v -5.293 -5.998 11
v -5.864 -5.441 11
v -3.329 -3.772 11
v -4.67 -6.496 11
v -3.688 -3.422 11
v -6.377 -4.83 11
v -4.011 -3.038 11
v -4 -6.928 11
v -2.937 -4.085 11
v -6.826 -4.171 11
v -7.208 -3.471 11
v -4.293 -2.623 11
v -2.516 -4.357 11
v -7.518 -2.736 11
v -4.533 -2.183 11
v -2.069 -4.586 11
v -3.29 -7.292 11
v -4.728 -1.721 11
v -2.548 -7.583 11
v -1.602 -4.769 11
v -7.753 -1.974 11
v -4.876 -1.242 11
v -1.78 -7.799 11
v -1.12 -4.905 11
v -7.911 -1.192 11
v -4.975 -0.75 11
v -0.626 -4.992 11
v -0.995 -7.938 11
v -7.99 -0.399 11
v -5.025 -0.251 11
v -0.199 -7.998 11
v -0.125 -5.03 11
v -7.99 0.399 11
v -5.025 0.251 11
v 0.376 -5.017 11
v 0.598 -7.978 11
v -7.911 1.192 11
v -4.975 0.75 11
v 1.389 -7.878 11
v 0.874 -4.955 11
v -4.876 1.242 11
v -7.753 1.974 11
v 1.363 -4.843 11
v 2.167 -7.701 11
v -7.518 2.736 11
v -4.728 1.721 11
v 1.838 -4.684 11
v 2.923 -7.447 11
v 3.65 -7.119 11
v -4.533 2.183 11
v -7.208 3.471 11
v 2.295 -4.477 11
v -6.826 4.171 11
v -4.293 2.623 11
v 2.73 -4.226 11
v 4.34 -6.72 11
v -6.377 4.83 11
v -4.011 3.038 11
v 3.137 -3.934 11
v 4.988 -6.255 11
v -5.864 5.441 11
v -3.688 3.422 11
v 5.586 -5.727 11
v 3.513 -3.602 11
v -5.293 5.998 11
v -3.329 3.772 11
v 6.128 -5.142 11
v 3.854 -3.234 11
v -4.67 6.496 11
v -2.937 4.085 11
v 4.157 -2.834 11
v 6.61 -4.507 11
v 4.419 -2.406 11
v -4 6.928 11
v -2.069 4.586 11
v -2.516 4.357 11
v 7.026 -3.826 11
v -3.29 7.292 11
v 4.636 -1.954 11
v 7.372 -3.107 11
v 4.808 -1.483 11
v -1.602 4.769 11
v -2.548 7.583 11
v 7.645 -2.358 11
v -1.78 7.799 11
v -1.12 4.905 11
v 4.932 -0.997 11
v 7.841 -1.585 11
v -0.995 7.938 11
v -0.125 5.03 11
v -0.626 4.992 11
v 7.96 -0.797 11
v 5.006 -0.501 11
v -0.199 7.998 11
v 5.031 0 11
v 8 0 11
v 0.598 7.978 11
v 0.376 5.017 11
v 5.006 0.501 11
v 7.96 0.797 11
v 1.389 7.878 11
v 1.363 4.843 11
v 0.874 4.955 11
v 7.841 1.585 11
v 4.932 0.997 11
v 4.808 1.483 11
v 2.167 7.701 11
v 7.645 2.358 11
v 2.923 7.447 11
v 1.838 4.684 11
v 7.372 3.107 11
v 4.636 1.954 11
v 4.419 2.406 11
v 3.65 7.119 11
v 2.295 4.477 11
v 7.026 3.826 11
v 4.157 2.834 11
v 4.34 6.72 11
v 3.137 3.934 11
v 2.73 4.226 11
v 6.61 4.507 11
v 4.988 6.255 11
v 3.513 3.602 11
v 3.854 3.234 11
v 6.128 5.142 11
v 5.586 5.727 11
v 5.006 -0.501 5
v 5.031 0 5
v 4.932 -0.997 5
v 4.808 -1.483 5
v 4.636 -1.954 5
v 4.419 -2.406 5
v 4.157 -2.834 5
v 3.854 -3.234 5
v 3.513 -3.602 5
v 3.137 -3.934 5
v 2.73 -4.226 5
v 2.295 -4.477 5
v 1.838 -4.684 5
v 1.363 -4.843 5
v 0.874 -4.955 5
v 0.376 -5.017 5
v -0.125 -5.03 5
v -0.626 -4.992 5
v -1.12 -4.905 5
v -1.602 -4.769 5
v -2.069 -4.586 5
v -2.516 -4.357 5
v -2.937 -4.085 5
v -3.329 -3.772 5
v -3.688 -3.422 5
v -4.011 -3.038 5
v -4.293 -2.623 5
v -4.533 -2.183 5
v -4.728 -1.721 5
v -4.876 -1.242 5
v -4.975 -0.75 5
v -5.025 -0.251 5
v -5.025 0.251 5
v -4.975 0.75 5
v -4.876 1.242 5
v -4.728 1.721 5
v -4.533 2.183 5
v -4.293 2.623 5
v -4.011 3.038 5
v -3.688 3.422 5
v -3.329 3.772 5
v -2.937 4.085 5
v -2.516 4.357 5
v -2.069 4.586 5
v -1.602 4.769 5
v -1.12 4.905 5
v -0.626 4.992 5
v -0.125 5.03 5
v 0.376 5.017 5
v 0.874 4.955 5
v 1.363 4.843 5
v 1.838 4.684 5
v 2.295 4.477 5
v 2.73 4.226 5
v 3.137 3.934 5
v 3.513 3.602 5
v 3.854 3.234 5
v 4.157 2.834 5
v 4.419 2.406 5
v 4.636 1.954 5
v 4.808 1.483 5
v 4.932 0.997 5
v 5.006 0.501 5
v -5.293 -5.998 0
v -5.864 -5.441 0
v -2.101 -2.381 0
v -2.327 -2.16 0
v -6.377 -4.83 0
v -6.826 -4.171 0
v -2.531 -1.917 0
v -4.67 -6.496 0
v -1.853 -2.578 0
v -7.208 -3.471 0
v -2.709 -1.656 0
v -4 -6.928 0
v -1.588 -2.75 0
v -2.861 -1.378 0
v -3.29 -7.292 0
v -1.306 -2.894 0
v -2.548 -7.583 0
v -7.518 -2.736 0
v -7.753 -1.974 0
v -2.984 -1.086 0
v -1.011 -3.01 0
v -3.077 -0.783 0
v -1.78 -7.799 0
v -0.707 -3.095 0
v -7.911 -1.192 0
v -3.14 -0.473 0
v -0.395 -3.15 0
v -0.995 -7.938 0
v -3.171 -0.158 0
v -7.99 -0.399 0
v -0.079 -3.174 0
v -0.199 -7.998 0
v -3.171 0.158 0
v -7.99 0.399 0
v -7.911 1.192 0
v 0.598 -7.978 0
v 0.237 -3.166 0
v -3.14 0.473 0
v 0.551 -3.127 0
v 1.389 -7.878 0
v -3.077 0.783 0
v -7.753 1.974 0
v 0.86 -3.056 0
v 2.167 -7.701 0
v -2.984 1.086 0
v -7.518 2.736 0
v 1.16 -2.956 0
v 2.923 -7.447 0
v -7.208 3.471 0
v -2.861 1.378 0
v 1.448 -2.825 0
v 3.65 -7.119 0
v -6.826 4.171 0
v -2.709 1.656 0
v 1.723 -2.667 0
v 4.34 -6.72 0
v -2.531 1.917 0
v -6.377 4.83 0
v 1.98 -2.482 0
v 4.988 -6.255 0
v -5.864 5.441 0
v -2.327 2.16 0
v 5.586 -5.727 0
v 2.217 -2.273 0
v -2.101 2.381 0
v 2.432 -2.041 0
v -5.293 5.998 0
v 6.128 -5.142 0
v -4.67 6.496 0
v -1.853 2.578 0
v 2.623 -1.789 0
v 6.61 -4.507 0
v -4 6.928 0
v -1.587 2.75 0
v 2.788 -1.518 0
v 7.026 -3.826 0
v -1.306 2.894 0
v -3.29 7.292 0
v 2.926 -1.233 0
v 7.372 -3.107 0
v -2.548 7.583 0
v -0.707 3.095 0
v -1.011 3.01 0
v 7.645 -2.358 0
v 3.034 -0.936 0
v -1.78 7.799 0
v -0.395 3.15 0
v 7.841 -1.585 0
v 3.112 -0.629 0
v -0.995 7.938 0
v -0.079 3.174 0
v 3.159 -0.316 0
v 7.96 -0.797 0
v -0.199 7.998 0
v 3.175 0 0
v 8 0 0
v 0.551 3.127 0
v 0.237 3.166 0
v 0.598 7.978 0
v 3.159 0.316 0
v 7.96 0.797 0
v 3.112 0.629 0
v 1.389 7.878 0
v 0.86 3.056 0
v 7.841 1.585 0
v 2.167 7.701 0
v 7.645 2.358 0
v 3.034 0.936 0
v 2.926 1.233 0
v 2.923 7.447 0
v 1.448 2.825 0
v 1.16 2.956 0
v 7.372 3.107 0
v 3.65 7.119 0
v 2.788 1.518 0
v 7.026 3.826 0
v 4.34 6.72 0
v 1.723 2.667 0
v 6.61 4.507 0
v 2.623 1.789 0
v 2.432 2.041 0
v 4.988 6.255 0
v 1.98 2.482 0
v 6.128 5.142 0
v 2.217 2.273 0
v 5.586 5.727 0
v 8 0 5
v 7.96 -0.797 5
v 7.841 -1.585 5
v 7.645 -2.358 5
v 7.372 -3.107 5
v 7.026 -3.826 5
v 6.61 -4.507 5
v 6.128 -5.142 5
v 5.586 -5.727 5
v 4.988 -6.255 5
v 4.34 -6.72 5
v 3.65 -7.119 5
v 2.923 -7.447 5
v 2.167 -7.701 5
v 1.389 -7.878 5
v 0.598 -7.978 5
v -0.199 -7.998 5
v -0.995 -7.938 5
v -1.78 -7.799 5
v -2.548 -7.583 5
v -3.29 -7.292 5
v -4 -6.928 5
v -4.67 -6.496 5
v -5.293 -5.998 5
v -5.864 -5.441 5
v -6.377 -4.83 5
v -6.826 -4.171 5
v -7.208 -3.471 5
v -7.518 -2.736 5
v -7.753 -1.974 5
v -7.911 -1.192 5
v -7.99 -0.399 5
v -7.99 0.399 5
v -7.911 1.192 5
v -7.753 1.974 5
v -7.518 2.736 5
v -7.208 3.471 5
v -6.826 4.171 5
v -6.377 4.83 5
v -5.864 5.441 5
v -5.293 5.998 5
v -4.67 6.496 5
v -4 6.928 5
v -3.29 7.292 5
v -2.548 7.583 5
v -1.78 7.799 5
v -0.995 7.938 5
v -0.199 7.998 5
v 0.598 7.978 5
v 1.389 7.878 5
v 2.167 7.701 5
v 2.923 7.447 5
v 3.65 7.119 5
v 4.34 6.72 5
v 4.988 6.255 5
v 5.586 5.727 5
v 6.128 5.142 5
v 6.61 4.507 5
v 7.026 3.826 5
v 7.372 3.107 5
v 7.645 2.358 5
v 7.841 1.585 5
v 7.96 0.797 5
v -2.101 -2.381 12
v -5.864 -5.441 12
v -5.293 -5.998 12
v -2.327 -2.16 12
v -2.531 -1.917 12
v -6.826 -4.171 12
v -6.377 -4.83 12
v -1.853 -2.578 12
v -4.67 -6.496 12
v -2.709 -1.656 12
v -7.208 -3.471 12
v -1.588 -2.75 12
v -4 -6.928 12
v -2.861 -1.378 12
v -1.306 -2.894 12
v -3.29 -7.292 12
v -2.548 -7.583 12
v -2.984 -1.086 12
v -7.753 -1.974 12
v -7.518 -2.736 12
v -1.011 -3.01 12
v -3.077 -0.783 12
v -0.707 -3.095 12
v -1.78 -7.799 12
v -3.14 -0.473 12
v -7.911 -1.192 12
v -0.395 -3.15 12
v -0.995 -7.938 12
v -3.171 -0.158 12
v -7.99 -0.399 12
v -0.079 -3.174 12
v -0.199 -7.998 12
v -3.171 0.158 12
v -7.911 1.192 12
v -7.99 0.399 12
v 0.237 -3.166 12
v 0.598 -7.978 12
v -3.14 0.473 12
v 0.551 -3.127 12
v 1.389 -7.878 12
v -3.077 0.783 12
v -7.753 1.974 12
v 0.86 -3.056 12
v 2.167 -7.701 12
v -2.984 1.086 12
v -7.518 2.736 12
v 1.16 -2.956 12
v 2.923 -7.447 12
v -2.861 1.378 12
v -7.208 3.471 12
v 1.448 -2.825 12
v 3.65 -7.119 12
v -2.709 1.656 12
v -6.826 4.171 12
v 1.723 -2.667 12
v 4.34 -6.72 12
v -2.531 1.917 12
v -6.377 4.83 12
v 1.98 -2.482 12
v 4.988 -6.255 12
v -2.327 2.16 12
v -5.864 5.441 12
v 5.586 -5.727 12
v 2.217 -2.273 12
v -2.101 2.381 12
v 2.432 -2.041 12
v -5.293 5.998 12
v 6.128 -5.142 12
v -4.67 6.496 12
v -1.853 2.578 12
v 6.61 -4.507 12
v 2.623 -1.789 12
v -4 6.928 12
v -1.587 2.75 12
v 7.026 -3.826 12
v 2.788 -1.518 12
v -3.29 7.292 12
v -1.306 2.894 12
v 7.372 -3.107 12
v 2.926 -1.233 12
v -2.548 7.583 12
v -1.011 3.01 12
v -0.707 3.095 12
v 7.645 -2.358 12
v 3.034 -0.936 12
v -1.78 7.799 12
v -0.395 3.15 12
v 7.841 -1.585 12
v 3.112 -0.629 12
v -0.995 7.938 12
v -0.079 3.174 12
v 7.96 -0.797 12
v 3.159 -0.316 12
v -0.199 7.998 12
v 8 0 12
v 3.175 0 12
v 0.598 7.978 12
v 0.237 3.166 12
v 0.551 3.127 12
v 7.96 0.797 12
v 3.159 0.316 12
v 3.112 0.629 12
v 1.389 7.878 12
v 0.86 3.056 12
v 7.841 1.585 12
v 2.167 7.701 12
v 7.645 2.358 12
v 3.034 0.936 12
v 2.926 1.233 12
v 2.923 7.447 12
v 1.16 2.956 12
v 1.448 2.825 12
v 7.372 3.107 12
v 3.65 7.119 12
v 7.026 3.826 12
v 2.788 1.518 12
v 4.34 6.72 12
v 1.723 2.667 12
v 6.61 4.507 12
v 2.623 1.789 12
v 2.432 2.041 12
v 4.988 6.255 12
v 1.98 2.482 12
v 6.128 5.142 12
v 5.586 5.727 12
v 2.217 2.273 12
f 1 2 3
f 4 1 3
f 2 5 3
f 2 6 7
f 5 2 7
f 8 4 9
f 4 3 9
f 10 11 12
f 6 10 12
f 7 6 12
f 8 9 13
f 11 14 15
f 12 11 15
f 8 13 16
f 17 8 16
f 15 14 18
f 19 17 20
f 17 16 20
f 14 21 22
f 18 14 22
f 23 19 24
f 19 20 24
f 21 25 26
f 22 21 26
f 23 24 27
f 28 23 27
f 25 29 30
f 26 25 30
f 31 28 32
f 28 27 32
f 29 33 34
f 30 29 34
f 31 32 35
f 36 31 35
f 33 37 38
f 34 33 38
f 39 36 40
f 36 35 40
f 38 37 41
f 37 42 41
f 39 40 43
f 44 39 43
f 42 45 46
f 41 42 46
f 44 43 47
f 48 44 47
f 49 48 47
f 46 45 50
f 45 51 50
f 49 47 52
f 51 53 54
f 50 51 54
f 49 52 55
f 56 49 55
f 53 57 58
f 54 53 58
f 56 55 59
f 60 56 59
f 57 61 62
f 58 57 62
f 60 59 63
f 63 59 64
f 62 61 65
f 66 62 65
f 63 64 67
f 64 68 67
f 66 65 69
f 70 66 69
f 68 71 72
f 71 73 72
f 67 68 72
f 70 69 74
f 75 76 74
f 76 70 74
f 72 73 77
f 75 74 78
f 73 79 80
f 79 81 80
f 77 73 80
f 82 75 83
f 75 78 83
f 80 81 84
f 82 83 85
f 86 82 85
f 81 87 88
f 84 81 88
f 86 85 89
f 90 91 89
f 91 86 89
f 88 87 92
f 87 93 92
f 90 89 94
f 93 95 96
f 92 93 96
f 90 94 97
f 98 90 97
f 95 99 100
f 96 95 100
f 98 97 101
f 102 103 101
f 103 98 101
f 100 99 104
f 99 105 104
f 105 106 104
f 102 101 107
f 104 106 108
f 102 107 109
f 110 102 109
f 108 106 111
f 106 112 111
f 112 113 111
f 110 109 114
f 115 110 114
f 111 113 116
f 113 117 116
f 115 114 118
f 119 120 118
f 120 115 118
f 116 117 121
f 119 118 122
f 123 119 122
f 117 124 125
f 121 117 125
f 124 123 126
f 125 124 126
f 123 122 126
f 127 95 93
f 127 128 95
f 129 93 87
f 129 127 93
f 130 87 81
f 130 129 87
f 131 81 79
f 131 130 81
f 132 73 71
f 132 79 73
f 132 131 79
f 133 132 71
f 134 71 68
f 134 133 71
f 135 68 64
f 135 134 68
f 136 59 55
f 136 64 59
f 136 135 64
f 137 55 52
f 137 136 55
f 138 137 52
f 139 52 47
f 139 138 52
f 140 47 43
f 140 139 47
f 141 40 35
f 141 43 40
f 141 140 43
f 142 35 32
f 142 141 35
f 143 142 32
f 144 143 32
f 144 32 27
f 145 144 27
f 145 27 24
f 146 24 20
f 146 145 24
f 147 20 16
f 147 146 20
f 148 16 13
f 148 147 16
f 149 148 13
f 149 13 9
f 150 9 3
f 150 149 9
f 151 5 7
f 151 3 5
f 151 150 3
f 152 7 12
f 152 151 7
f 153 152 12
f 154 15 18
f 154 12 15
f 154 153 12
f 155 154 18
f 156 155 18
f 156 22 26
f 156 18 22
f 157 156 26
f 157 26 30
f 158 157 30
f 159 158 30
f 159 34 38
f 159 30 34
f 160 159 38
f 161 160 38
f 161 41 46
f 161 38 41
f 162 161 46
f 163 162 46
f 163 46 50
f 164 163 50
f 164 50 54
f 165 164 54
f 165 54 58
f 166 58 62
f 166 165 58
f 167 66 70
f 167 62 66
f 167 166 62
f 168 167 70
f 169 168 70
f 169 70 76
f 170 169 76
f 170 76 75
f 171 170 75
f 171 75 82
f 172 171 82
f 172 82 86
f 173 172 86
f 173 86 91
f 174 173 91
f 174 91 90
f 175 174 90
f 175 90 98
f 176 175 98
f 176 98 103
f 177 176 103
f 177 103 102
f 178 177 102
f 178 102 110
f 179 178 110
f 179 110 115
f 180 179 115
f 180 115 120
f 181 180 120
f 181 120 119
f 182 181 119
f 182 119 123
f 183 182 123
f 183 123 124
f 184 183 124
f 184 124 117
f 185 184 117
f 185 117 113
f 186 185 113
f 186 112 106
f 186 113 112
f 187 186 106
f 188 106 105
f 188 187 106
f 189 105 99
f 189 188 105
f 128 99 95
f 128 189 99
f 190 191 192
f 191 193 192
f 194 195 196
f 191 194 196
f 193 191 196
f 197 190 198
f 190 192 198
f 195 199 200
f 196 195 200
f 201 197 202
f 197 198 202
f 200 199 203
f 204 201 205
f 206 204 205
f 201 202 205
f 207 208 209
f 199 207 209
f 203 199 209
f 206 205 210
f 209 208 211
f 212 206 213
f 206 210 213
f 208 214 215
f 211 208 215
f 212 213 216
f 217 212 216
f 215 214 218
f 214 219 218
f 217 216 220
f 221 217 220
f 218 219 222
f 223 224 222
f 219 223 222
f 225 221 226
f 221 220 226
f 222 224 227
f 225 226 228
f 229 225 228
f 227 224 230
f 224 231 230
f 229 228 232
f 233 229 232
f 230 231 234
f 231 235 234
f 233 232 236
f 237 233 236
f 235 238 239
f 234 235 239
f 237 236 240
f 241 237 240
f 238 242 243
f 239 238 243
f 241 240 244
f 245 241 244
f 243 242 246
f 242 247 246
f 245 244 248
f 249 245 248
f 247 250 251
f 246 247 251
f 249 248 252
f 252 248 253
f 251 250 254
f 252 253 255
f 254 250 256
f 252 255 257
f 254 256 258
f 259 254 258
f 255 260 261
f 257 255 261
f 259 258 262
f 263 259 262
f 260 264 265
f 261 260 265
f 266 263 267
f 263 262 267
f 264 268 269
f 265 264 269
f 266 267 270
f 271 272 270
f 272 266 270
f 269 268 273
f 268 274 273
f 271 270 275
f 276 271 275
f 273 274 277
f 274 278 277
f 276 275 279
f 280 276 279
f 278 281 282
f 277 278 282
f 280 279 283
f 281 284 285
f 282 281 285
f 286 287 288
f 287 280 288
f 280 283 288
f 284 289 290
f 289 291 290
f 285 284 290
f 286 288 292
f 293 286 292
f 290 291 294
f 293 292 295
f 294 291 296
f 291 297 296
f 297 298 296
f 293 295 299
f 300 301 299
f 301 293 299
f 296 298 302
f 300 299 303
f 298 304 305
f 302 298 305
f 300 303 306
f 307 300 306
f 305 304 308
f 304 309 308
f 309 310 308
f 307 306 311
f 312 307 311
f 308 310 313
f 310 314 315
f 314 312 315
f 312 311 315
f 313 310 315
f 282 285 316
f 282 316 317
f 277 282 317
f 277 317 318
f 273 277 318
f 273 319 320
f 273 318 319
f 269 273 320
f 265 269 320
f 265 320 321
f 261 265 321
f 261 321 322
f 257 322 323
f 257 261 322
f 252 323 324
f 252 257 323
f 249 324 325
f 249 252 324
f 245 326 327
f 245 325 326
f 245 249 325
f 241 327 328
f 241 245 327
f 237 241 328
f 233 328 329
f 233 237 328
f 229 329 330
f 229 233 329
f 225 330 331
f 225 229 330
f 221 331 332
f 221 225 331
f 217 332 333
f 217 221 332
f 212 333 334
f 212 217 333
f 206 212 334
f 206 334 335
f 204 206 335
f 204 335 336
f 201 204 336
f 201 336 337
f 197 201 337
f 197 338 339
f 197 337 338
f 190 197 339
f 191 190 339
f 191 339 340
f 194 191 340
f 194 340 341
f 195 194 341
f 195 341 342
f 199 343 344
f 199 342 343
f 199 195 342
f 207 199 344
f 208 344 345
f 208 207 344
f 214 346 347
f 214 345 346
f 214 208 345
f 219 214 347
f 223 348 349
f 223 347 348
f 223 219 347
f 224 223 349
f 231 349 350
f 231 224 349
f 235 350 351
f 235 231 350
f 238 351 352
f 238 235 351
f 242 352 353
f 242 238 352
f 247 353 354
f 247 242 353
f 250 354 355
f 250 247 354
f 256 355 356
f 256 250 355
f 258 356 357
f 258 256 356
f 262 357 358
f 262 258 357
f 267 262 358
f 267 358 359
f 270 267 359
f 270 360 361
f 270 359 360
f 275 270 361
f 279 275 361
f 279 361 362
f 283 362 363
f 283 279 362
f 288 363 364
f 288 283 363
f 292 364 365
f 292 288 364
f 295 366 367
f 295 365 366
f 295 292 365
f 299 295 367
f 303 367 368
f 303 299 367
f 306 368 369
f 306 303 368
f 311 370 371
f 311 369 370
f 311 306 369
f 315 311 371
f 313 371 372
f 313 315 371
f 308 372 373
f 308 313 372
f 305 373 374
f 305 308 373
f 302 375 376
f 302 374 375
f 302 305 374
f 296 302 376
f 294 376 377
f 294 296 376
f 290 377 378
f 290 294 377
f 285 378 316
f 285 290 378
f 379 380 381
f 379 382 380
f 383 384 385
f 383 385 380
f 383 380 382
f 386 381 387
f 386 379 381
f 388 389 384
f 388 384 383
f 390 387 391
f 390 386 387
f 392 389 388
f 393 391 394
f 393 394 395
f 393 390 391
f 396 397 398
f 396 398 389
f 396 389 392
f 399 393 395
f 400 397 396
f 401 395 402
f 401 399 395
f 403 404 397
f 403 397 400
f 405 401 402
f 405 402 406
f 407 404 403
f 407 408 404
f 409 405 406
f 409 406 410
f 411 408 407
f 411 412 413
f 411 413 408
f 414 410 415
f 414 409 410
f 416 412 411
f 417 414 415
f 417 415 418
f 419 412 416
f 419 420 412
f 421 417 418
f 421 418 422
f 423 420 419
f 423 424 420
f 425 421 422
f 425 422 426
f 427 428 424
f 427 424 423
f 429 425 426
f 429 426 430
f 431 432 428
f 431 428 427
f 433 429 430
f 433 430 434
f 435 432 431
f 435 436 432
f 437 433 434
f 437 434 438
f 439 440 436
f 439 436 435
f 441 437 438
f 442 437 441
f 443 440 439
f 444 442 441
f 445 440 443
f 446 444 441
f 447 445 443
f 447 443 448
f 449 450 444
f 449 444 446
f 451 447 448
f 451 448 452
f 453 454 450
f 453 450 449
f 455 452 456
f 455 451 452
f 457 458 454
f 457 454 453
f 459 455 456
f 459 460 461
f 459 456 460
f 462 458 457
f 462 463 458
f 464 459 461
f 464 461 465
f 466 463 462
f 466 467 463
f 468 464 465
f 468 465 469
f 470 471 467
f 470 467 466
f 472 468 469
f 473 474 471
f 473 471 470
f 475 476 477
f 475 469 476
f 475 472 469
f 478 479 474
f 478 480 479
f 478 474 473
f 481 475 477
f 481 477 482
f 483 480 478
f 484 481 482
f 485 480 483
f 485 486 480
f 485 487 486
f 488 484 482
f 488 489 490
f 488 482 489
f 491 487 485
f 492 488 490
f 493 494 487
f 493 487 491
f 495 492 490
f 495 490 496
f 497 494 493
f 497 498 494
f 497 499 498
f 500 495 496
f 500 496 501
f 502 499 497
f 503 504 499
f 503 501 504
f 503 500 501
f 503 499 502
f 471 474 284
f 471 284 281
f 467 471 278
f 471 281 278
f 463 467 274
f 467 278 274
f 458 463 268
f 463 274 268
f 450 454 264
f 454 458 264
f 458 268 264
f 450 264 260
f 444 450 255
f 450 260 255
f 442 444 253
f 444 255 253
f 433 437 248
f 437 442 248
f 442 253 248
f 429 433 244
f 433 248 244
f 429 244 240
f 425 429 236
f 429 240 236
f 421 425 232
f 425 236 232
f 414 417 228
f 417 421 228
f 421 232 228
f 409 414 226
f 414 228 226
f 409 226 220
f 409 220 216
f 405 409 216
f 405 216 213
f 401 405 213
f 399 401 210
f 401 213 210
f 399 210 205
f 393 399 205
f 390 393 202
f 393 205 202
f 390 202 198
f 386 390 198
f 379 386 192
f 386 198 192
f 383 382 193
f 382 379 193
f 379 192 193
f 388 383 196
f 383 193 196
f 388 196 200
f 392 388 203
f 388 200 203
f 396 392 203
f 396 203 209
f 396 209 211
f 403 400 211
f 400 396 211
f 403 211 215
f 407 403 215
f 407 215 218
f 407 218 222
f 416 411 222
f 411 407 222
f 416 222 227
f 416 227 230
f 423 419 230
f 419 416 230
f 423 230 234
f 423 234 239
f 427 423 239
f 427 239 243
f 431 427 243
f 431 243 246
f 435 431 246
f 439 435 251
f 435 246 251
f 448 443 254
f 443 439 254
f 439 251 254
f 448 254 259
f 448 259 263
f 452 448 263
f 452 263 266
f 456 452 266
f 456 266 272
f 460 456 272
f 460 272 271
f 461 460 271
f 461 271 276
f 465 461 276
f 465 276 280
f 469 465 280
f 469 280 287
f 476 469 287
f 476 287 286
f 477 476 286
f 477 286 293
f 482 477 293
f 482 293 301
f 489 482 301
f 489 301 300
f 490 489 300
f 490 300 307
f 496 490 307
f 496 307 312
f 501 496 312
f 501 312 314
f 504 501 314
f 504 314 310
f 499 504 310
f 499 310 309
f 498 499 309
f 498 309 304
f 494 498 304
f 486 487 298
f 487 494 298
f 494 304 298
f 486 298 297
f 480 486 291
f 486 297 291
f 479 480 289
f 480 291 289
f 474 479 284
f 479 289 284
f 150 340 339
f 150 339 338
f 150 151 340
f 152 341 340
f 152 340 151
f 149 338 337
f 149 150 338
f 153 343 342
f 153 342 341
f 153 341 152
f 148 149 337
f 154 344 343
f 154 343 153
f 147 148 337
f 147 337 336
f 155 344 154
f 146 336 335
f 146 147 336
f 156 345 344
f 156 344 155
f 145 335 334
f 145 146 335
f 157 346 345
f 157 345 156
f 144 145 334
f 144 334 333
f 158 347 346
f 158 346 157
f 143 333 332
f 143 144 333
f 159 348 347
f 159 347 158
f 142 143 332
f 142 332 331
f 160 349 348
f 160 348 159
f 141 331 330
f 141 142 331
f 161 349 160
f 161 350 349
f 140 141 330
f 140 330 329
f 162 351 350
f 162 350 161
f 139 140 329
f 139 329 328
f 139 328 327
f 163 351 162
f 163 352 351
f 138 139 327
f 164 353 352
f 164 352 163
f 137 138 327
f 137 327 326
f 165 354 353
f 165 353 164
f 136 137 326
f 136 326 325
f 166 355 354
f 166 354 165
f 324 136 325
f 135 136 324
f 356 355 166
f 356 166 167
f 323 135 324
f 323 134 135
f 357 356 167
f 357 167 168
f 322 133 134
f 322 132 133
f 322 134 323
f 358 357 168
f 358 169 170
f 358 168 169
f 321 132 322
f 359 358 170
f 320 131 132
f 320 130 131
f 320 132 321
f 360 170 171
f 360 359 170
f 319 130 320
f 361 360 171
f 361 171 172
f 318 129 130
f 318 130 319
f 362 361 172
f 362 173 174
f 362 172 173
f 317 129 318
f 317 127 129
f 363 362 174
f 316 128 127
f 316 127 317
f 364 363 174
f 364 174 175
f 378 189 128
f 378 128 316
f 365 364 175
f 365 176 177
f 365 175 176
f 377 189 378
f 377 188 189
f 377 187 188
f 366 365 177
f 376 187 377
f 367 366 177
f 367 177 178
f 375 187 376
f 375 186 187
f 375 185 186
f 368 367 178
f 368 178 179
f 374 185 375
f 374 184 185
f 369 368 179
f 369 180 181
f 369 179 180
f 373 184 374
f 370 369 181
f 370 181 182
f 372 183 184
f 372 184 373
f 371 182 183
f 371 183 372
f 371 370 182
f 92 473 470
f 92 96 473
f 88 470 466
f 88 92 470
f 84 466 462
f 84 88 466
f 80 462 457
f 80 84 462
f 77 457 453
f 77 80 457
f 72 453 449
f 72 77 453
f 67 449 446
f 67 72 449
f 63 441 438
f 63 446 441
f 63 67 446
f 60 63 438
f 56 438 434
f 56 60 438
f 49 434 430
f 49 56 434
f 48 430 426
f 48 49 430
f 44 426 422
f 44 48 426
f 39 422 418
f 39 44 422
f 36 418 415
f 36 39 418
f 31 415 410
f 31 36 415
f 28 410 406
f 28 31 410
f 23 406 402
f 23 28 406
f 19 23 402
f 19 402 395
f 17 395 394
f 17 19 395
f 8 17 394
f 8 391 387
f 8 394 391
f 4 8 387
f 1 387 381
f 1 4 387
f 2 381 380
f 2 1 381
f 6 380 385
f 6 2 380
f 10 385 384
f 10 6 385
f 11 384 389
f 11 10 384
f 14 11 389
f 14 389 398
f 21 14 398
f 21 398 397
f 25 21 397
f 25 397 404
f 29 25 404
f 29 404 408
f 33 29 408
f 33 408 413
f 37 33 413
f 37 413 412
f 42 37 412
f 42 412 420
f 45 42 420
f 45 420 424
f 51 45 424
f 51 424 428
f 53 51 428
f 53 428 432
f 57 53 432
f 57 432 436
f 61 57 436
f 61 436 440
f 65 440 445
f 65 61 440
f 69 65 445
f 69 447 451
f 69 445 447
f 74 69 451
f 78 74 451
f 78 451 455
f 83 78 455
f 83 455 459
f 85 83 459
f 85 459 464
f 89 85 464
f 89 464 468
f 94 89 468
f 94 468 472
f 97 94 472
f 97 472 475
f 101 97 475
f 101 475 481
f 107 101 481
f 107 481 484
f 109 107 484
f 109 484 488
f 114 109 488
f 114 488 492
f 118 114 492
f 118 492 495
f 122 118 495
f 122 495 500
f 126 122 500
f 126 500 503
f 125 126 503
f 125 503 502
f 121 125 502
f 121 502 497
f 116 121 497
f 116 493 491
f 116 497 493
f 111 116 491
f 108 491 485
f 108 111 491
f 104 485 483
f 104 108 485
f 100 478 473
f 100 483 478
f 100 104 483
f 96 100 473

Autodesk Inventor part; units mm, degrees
ref_plane "YZ Plane" through (0, 0, 0) normal (1, 0, 0) x (0, 1, 0)
ref_plane "XZ Plane" through (0, 0, 0) normal (0, 1, 0) x (-1, 0, 0)
ref_plane "XY Plane" through (0, 0, 0) normal (0, 0, 1) x (1, 0, 0)
sketch "Boceto1" plane through (0, 0, 0) normal (0, 0, 1) x (1, 0, 0)
  circle A0 centre (0, 0) radius 8
  circle A1 centre (0, 0) radius 3.175
  dimension "d0" = 16
  dimension "d1" = 6.35
extrude "Extrusión1" add sketch "Boceto1" along normal blind 5
sketch "Boceto2" plane through (0, 0, 5) normal (0, 0, 1) x (1, 0, 0)
  circle A0 centre (0, 0) radius 3.175
  circle A1 centre (0, 0) radius 5.0313
  dimension "d8" = 6.35
extrude "Extrusión2" add sketch "Boceto2" along normal blind 6
sketch "Boceto3" plane through (0, 0, 11) normal (0, 0, 1) x (1, 0, 0)
  circle A0 centre (0, 0) radius 3.175
  circle A1 centre (0, 0) radius 8
  dimension "d9" = 6.35
  dimension "d10" = 16
extrude "Extrusión3" add sketch "Boceto3" along normal blind 1
properties part number "Polea"
